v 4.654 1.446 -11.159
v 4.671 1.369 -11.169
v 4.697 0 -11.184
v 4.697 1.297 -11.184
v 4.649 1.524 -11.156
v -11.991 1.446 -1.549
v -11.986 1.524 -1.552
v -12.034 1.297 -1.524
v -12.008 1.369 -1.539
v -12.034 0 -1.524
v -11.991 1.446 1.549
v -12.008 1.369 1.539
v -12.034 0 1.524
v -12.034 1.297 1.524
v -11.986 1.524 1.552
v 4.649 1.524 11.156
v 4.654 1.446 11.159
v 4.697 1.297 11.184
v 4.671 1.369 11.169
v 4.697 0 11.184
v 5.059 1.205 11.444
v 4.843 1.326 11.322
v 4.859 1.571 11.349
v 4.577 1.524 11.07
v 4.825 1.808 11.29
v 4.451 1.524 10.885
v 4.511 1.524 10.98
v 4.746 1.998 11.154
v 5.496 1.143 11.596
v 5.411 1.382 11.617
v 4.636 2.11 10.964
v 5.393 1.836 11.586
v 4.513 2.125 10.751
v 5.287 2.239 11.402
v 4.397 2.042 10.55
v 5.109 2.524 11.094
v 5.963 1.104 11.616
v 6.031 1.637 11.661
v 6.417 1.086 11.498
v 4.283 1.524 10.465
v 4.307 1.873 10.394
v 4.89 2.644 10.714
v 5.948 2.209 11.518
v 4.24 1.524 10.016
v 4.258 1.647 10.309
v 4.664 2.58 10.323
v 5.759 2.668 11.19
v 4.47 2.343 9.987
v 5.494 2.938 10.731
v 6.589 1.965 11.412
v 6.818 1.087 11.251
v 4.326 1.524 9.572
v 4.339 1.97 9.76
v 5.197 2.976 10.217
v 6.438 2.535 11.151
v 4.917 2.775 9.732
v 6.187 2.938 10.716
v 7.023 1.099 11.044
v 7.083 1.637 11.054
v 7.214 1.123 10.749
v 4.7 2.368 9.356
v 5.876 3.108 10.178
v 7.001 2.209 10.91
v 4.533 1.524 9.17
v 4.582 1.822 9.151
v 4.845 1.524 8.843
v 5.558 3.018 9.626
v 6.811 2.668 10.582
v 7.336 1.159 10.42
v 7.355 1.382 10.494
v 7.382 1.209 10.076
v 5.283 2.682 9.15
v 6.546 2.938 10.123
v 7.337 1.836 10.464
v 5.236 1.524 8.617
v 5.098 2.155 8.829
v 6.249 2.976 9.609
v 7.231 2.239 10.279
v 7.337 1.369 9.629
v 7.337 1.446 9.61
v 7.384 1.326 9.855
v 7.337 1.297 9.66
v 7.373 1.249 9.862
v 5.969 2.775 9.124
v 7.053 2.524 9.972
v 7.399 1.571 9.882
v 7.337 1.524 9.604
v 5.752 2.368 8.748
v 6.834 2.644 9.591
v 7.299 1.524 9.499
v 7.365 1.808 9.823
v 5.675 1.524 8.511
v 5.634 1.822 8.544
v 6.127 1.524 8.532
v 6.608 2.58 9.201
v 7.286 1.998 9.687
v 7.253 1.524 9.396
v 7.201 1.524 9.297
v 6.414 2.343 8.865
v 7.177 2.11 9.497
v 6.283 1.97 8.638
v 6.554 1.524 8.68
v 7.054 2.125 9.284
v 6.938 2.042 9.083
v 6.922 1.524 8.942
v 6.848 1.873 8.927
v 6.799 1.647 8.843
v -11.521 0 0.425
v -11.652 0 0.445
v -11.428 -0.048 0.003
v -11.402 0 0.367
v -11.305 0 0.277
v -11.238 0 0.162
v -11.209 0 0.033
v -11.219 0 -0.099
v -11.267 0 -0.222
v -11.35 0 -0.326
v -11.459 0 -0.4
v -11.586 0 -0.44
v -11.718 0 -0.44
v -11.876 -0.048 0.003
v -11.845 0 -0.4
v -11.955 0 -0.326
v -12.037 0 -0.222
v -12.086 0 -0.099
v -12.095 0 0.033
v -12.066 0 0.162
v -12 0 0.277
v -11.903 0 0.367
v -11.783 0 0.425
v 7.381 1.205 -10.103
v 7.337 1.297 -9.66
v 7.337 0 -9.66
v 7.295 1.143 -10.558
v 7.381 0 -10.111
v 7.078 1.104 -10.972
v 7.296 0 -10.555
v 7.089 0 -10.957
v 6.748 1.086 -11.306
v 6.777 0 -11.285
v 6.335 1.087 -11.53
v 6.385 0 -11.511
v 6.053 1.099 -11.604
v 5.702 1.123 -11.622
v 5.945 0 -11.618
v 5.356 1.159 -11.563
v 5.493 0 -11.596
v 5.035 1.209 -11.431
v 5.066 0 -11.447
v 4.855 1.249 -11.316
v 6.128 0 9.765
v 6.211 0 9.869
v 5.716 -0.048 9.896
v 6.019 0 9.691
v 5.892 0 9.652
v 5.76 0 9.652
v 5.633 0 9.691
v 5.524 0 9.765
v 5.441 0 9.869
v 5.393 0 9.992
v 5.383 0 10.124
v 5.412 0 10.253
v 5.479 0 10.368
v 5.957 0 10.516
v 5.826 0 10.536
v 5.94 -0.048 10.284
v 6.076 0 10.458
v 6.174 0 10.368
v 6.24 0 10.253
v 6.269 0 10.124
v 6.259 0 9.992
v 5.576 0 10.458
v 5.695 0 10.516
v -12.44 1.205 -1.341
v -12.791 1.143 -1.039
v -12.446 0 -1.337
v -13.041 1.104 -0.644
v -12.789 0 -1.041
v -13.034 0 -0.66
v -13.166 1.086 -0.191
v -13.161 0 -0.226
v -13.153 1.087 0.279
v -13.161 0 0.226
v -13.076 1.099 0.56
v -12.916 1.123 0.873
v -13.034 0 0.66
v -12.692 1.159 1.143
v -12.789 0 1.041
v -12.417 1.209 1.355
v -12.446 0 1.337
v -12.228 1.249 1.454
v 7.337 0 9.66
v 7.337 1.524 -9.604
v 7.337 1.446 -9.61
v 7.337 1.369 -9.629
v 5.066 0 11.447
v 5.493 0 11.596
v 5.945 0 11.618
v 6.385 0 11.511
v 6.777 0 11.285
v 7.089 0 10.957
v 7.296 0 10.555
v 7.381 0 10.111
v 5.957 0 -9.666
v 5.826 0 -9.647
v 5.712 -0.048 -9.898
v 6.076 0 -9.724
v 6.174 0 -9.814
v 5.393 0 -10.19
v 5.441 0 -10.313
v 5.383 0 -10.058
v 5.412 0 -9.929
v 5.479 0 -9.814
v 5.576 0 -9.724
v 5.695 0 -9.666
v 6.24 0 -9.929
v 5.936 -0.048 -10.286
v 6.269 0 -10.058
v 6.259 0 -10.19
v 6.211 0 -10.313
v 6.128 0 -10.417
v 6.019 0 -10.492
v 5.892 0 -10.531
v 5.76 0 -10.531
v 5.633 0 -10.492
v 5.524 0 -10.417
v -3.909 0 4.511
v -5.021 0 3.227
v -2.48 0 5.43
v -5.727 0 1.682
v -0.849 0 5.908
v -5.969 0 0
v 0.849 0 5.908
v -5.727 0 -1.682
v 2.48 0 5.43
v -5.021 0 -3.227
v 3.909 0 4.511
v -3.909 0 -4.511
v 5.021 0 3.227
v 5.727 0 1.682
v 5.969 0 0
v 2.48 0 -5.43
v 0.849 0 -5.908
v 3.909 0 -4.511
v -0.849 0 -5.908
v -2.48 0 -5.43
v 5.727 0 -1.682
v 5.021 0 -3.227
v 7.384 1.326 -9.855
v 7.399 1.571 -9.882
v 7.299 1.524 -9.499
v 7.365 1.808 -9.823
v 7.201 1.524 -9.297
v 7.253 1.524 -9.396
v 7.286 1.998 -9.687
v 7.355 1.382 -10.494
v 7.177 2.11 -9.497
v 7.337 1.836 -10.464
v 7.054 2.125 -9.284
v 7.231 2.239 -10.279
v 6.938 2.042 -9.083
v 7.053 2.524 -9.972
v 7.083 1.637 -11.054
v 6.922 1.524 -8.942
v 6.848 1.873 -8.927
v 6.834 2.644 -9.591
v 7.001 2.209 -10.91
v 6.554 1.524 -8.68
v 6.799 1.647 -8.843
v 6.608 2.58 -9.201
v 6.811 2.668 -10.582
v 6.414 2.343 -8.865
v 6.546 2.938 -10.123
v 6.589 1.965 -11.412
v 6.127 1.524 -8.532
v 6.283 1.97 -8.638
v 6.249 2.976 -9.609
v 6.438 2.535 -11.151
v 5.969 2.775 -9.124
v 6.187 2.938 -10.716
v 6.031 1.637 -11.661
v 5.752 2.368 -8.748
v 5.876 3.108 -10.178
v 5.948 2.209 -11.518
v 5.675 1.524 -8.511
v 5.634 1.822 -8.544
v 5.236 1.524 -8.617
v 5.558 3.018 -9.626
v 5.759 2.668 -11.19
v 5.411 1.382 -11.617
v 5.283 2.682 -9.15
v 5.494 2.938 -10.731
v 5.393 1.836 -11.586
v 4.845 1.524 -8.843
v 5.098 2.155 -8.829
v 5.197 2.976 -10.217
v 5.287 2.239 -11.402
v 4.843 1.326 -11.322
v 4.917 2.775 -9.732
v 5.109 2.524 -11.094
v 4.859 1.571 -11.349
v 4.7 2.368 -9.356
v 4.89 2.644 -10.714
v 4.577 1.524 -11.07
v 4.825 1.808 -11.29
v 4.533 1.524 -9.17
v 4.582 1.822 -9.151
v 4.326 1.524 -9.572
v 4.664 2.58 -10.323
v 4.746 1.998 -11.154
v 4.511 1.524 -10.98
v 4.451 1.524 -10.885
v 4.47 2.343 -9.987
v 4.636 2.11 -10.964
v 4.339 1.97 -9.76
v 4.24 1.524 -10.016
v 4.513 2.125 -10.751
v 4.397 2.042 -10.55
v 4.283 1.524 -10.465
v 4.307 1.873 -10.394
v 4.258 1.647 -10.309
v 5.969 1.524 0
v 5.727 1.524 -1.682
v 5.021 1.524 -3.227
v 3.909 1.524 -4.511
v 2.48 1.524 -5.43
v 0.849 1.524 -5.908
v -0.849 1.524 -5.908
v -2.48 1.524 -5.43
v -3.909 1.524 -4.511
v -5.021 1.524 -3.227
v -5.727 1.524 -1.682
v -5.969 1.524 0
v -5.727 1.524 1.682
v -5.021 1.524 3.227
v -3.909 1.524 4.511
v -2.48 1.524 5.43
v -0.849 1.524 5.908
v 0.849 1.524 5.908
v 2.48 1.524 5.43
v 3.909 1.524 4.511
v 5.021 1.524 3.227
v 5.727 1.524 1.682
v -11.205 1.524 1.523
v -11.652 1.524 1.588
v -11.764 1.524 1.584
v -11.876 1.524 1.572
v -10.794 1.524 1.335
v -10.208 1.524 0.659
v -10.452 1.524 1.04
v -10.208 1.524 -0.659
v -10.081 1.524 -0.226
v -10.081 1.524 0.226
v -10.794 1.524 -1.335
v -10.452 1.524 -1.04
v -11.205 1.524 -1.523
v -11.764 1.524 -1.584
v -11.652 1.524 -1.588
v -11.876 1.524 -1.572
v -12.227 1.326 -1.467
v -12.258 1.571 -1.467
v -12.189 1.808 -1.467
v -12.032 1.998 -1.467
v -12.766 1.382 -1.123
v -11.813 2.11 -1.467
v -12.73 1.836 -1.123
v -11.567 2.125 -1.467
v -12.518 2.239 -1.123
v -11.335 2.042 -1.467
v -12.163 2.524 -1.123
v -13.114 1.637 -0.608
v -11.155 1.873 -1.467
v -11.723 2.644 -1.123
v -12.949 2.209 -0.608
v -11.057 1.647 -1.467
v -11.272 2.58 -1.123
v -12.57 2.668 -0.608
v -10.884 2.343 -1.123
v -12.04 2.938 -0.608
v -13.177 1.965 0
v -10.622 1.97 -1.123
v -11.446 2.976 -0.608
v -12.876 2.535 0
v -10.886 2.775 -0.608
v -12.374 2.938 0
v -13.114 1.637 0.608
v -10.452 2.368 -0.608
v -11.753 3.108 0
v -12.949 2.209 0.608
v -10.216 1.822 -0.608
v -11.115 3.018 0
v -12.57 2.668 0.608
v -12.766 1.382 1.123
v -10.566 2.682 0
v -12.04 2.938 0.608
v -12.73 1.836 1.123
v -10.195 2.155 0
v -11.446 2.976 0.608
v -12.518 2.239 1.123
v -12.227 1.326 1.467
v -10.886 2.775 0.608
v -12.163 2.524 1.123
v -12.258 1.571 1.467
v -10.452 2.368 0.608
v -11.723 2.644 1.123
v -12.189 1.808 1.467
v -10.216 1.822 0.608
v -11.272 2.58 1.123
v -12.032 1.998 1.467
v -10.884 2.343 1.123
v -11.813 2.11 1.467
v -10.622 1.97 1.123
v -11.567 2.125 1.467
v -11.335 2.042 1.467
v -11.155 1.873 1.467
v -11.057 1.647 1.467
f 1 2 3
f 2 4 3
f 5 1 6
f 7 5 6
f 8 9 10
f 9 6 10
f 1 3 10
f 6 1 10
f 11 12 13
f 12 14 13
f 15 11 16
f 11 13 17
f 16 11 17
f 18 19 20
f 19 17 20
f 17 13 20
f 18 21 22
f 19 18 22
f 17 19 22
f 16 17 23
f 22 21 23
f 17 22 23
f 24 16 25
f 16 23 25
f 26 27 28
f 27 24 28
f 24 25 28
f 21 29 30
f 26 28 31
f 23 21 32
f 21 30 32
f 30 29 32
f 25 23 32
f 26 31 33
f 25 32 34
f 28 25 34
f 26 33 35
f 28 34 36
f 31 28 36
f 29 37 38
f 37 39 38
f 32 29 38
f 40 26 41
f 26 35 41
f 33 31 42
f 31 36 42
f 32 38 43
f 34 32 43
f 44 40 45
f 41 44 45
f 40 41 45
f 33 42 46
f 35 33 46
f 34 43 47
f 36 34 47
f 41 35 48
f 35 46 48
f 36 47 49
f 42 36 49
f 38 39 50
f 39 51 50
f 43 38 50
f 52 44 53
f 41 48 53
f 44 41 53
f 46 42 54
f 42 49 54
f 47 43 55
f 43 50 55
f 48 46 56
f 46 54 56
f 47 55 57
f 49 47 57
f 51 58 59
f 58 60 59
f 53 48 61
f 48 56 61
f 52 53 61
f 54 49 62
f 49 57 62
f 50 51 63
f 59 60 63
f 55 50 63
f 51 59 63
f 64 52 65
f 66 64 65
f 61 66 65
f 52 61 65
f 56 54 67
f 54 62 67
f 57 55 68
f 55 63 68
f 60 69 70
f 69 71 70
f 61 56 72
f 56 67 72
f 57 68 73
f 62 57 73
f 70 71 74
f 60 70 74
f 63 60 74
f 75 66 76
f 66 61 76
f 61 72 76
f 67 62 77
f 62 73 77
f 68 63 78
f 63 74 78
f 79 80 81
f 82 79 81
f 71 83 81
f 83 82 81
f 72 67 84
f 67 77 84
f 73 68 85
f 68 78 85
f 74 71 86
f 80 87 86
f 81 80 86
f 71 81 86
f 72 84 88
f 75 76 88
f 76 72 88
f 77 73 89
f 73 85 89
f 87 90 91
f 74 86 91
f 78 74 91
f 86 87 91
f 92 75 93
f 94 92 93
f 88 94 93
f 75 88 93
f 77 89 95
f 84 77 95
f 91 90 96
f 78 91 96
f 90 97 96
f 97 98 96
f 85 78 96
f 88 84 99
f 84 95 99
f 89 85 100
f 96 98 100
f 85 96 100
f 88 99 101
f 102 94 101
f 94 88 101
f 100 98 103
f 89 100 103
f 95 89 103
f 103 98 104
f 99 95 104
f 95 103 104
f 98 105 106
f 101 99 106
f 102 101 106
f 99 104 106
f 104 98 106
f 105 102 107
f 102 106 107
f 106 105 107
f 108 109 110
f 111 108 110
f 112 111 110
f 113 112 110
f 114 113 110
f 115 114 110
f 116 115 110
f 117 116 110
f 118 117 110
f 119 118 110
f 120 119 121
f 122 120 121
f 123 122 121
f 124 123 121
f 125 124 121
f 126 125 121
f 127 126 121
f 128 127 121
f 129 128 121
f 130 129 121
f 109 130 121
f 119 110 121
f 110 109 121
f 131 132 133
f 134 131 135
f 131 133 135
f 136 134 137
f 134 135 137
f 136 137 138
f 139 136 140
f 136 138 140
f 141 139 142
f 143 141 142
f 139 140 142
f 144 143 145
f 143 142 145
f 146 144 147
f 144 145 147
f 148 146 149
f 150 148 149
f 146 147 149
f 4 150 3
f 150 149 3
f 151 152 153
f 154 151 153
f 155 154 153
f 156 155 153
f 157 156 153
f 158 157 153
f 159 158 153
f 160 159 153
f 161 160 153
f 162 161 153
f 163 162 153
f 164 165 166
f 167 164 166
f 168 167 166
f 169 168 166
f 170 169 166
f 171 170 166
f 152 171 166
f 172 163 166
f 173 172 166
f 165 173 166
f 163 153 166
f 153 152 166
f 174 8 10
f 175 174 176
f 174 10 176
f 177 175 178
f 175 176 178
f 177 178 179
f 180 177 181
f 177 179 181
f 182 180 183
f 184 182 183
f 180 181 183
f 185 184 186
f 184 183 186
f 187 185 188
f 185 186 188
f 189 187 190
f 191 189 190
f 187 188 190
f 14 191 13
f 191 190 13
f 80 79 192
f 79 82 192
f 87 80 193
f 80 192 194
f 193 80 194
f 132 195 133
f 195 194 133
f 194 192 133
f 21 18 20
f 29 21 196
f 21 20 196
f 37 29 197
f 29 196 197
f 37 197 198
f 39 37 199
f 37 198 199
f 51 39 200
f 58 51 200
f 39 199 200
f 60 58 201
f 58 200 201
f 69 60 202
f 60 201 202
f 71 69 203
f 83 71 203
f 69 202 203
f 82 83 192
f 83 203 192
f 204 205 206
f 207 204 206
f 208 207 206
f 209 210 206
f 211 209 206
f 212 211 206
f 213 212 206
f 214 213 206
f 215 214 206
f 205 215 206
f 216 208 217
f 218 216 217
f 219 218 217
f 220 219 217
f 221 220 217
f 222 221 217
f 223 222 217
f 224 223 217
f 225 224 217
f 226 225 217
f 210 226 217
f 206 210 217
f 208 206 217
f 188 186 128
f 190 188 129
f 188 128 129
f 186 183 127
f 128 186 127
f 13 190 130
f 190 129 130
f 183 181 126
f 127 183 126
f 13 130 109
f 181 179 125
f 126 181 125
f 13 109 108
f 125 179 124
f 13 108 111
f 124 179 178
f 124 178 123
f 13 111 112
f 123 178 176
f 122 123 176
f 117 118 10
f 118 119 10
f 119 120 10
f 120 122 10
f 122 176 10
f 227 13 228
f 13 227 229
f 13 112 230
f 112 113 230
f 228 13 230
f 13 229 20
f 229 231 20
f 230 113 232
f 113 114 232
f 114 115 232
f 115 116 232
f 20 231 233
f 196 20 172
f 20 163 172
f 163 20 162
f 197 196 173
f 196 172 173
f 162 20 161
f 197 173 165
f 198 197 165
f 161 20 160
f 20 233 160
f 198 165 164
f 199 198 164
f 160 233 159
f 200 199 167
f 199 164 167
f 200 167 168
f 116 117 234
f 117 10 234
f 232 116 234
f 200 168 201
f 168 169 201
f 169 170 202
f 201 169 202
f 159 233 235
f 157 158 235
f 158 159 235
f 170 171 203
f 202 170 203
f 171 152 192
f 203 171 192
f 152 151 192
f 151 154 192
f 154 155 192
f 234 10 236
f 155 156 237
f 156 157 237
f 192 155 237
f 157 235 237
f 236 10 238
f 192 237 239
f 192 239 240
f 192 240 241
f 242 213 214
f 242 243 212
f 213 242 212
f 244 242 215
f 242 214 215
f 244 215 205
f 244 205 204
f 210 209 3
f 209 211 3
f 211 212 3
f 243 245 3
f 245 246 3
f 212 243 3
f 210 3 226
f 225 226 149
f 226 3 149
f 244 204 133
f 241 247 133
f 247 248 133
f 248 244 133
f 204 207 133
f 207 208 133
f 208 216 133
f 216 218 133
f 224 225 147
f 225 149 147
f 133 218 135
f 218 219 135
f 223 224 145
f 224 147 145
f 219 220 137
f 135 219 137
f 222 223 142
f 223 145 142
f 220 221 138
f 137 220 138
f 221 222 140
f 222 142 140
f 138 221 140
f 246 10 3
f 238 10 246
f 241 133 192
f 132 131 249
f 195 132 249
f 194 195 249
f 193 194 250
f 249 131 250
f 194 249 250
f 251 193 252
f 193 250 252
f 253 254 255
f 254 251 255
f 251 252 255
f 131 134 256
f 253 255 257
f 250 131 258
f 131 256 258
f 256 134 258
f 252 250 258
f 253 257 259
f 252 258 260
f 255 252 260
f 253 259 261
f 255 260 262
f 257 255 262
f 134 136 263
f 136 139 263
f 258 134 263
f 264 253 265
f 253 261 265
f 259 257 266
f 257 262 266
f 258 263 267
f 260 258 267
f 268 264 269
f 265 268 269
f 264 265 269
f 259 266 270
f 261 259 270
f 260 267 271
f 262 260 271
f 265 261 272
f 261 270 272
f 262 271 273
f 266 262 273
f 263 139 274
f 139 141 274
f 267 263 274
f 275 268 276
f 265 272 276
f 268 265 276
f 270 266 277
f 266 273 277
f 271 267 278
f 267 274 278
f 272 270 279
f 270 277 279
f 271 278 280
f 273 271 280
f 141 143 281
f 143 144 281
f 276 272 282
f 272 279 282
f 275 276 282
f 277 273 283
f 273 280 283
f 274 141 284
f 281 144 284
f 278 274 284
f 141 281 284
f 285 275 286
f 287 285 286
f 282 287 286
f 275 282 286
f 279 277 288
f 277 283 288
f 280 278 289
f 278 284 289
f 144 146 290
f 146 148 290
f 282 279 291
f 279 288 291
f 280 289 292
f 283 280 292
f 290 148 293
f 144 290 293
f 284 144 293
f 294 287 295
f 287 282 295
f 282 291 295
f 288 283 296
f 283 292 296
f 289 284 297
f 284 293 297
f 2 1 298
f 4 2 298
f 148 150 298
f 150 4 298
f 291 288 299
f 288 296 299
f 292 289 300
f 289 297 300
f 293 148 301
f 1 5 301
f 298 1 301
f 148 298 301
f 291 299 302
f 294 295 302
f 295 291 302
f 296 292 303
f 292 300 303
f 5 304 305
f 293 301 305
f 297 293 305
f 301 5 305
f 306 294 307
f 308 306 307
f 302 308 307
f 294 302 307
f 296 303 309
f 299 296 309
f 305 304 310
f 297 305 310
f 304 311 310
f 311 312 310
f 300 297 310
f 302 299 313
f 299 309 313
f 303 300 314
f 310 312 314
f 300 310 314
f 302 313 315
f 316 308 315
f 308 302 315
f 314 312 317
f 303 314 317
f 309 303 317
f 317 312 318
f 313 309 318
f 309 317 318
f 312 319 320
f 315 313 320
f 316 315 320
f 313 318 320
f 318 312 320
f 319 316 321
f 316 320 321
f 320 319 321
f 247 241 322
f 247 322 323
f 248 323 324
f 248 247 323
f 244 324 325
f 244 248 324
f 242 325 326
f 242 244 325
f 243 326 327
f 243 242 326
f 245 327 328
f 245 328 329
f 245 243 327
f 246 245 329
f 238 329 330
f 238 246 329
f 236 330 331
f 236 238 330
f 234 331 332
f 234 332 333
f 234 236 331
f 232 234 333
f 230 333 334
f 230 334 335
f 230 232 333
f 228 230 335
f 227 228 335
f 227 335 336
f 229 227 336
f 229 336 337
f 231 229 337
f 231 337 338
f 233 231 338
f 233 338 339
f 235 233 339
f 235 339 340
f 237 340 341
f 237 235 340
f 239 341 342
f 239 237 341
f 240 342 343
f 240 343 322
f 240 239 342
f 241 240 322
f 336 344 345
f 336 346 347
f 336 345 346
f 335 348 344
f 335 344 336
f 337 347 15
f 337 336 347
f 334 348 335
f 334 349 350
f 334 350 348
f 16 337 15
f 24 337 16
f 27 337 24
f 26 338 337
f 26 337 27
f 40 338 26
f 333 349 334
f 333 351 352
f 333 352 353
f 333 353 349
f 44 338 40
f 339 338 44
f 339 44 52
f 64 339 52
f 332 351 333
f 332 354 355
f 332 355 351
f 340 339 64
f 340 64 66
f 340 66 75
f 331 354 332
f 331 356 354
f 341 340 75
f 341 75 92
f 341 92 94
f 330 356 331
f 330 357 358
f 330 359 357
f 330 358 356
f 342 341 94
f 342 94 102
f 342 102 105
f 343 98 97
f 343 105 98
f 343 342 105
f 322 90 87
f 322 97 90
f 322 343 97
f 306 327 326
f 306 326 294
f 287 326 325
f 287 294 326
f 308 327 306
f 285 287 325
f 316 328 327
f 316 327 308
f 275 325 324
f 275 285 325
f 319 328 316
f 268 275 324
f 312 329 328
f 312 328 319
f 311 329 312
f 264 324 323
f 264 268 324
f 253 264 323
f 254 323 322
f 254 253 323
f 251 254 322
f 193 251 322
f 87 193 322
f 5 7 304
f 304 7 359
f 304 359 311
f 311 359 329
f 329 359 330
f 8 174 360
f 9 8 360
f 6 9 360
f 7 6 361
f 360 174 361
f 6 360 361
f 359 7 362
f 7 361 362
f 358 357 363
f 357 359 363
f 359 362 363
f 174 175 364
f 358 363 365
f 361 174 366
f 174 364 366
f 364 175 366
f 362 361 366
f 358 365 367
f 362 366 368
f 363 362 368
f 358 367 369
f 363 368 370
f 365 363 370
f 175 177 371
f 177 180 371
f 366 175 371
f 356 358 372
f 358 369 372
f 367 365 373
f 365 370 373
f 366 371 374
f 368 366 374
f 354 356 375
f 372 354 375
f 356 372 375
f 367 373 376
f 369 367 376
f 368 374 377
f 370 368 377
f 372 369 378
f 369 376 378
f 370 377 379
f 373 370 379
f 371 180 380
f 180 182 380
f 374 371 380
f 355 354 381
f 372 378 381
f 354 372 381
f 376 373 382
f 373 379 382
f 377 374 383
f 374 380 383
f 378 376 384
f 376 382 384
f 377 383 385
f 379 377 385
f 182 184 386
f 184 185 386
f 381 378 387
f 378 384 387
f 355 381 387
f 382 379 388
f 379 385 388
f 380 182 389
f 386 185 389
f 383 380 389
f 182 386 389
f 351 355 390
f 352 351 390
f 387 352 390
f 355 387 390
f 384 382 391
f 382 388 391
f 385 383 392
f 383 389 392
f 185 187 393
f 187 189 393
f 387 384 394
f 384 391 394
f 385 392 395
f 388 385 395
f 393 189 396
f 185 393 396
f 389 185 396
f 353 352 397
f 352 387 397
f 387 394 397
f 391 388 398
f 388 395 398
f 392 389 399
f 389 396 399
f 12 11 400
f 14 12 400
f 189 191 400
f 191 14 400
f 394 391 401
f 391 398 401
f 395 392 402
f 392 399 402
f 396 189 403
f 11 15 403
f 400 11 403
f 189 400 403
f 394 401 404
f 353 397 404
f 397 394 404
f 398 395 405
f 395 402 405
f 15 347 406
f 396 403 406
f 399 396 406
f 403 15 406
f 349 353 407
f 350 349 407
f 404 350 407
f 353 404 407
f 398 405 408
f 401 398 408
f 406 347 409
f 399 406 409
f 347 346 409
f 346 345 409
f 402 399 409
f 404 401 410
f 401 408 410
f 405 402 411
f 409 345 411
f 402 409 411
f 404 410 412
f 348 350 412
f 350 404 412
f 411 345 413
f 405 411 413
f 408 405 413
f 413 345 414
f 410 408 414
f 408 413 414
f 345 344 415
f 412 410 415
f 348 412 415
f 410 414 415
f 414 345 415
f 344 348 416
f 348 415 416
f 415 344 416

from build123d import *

# Parameters (mm, degrees)
SKETCH1_R           = 5.969
BOSS_EXTRUDE1_DEPTH = 1.524
CIRPATTERN2_COUNT   = 3


with BuildPart() as part:
    # Sketch1 → Boss-Extrude1 (new body)
    with BuildSketch(Plane(origin=(0, 0, 0), x_dir=(1, 0, 0), z_dir=(0, 1, 0))):
        with BuildLine():
            Line((4.697427285, 11.184182722), (-12.0345, 1.524))
            ThreePointArc((-12.0345, 1.524), (-13.1775, 0), (-12.0345, -1.524))
            Line((-12.0345, -1.524), (4.697427285, -11.184182722))
            ThreePointArc((4.697427285, -11.184182722), (6.58875, -11.412049758), (7.337072715, -9.660182722))
            Line((7.337072715, -9.660182722), (7.337072715, 9.660182722))
            ThreePointArc((7.337072715, 9.660182722), (6.58875, 11.412049758), (4.697427285, 11.184182722))
        make_face()
        Circle(SKETCH1_R, mode=Mode.SUBTRACT)
    extrude(amount=BOSS_EXTRUDE1_DEPTH)

    # Sketch2 → Revolve1 (revolve)
    with BuildSketch(Plane(origin=(0, 1.524, 0), x_dir=(1, 0, 0), z_dir=(0, 1, 0))):
        with BuildLine():
            Line((-11.65220136, -1.5875), (-11.65220136, 1.5875))
            ThreePointArc((-11.65220136, 1.5875), (-10.06470136, 0), (-11.65220136, -1.5875))
        make_face()
    revolve1 = revolve(axis=Axis((-11.65220136, 1.524, 1.5875), (0, 0, -1)))

    # CirPattern2: Revolve1 ×3 about axis
    cirpattern2_axis = Axis((0, 0, 0), (0, 1, 0))
    for i in range(1, CIRPATTERN2_COUNT):
        add(revolve1.rotate(cirpattern2_axis, i * 360 / CIRPATTERN2_COUNT))


solid = part.part
